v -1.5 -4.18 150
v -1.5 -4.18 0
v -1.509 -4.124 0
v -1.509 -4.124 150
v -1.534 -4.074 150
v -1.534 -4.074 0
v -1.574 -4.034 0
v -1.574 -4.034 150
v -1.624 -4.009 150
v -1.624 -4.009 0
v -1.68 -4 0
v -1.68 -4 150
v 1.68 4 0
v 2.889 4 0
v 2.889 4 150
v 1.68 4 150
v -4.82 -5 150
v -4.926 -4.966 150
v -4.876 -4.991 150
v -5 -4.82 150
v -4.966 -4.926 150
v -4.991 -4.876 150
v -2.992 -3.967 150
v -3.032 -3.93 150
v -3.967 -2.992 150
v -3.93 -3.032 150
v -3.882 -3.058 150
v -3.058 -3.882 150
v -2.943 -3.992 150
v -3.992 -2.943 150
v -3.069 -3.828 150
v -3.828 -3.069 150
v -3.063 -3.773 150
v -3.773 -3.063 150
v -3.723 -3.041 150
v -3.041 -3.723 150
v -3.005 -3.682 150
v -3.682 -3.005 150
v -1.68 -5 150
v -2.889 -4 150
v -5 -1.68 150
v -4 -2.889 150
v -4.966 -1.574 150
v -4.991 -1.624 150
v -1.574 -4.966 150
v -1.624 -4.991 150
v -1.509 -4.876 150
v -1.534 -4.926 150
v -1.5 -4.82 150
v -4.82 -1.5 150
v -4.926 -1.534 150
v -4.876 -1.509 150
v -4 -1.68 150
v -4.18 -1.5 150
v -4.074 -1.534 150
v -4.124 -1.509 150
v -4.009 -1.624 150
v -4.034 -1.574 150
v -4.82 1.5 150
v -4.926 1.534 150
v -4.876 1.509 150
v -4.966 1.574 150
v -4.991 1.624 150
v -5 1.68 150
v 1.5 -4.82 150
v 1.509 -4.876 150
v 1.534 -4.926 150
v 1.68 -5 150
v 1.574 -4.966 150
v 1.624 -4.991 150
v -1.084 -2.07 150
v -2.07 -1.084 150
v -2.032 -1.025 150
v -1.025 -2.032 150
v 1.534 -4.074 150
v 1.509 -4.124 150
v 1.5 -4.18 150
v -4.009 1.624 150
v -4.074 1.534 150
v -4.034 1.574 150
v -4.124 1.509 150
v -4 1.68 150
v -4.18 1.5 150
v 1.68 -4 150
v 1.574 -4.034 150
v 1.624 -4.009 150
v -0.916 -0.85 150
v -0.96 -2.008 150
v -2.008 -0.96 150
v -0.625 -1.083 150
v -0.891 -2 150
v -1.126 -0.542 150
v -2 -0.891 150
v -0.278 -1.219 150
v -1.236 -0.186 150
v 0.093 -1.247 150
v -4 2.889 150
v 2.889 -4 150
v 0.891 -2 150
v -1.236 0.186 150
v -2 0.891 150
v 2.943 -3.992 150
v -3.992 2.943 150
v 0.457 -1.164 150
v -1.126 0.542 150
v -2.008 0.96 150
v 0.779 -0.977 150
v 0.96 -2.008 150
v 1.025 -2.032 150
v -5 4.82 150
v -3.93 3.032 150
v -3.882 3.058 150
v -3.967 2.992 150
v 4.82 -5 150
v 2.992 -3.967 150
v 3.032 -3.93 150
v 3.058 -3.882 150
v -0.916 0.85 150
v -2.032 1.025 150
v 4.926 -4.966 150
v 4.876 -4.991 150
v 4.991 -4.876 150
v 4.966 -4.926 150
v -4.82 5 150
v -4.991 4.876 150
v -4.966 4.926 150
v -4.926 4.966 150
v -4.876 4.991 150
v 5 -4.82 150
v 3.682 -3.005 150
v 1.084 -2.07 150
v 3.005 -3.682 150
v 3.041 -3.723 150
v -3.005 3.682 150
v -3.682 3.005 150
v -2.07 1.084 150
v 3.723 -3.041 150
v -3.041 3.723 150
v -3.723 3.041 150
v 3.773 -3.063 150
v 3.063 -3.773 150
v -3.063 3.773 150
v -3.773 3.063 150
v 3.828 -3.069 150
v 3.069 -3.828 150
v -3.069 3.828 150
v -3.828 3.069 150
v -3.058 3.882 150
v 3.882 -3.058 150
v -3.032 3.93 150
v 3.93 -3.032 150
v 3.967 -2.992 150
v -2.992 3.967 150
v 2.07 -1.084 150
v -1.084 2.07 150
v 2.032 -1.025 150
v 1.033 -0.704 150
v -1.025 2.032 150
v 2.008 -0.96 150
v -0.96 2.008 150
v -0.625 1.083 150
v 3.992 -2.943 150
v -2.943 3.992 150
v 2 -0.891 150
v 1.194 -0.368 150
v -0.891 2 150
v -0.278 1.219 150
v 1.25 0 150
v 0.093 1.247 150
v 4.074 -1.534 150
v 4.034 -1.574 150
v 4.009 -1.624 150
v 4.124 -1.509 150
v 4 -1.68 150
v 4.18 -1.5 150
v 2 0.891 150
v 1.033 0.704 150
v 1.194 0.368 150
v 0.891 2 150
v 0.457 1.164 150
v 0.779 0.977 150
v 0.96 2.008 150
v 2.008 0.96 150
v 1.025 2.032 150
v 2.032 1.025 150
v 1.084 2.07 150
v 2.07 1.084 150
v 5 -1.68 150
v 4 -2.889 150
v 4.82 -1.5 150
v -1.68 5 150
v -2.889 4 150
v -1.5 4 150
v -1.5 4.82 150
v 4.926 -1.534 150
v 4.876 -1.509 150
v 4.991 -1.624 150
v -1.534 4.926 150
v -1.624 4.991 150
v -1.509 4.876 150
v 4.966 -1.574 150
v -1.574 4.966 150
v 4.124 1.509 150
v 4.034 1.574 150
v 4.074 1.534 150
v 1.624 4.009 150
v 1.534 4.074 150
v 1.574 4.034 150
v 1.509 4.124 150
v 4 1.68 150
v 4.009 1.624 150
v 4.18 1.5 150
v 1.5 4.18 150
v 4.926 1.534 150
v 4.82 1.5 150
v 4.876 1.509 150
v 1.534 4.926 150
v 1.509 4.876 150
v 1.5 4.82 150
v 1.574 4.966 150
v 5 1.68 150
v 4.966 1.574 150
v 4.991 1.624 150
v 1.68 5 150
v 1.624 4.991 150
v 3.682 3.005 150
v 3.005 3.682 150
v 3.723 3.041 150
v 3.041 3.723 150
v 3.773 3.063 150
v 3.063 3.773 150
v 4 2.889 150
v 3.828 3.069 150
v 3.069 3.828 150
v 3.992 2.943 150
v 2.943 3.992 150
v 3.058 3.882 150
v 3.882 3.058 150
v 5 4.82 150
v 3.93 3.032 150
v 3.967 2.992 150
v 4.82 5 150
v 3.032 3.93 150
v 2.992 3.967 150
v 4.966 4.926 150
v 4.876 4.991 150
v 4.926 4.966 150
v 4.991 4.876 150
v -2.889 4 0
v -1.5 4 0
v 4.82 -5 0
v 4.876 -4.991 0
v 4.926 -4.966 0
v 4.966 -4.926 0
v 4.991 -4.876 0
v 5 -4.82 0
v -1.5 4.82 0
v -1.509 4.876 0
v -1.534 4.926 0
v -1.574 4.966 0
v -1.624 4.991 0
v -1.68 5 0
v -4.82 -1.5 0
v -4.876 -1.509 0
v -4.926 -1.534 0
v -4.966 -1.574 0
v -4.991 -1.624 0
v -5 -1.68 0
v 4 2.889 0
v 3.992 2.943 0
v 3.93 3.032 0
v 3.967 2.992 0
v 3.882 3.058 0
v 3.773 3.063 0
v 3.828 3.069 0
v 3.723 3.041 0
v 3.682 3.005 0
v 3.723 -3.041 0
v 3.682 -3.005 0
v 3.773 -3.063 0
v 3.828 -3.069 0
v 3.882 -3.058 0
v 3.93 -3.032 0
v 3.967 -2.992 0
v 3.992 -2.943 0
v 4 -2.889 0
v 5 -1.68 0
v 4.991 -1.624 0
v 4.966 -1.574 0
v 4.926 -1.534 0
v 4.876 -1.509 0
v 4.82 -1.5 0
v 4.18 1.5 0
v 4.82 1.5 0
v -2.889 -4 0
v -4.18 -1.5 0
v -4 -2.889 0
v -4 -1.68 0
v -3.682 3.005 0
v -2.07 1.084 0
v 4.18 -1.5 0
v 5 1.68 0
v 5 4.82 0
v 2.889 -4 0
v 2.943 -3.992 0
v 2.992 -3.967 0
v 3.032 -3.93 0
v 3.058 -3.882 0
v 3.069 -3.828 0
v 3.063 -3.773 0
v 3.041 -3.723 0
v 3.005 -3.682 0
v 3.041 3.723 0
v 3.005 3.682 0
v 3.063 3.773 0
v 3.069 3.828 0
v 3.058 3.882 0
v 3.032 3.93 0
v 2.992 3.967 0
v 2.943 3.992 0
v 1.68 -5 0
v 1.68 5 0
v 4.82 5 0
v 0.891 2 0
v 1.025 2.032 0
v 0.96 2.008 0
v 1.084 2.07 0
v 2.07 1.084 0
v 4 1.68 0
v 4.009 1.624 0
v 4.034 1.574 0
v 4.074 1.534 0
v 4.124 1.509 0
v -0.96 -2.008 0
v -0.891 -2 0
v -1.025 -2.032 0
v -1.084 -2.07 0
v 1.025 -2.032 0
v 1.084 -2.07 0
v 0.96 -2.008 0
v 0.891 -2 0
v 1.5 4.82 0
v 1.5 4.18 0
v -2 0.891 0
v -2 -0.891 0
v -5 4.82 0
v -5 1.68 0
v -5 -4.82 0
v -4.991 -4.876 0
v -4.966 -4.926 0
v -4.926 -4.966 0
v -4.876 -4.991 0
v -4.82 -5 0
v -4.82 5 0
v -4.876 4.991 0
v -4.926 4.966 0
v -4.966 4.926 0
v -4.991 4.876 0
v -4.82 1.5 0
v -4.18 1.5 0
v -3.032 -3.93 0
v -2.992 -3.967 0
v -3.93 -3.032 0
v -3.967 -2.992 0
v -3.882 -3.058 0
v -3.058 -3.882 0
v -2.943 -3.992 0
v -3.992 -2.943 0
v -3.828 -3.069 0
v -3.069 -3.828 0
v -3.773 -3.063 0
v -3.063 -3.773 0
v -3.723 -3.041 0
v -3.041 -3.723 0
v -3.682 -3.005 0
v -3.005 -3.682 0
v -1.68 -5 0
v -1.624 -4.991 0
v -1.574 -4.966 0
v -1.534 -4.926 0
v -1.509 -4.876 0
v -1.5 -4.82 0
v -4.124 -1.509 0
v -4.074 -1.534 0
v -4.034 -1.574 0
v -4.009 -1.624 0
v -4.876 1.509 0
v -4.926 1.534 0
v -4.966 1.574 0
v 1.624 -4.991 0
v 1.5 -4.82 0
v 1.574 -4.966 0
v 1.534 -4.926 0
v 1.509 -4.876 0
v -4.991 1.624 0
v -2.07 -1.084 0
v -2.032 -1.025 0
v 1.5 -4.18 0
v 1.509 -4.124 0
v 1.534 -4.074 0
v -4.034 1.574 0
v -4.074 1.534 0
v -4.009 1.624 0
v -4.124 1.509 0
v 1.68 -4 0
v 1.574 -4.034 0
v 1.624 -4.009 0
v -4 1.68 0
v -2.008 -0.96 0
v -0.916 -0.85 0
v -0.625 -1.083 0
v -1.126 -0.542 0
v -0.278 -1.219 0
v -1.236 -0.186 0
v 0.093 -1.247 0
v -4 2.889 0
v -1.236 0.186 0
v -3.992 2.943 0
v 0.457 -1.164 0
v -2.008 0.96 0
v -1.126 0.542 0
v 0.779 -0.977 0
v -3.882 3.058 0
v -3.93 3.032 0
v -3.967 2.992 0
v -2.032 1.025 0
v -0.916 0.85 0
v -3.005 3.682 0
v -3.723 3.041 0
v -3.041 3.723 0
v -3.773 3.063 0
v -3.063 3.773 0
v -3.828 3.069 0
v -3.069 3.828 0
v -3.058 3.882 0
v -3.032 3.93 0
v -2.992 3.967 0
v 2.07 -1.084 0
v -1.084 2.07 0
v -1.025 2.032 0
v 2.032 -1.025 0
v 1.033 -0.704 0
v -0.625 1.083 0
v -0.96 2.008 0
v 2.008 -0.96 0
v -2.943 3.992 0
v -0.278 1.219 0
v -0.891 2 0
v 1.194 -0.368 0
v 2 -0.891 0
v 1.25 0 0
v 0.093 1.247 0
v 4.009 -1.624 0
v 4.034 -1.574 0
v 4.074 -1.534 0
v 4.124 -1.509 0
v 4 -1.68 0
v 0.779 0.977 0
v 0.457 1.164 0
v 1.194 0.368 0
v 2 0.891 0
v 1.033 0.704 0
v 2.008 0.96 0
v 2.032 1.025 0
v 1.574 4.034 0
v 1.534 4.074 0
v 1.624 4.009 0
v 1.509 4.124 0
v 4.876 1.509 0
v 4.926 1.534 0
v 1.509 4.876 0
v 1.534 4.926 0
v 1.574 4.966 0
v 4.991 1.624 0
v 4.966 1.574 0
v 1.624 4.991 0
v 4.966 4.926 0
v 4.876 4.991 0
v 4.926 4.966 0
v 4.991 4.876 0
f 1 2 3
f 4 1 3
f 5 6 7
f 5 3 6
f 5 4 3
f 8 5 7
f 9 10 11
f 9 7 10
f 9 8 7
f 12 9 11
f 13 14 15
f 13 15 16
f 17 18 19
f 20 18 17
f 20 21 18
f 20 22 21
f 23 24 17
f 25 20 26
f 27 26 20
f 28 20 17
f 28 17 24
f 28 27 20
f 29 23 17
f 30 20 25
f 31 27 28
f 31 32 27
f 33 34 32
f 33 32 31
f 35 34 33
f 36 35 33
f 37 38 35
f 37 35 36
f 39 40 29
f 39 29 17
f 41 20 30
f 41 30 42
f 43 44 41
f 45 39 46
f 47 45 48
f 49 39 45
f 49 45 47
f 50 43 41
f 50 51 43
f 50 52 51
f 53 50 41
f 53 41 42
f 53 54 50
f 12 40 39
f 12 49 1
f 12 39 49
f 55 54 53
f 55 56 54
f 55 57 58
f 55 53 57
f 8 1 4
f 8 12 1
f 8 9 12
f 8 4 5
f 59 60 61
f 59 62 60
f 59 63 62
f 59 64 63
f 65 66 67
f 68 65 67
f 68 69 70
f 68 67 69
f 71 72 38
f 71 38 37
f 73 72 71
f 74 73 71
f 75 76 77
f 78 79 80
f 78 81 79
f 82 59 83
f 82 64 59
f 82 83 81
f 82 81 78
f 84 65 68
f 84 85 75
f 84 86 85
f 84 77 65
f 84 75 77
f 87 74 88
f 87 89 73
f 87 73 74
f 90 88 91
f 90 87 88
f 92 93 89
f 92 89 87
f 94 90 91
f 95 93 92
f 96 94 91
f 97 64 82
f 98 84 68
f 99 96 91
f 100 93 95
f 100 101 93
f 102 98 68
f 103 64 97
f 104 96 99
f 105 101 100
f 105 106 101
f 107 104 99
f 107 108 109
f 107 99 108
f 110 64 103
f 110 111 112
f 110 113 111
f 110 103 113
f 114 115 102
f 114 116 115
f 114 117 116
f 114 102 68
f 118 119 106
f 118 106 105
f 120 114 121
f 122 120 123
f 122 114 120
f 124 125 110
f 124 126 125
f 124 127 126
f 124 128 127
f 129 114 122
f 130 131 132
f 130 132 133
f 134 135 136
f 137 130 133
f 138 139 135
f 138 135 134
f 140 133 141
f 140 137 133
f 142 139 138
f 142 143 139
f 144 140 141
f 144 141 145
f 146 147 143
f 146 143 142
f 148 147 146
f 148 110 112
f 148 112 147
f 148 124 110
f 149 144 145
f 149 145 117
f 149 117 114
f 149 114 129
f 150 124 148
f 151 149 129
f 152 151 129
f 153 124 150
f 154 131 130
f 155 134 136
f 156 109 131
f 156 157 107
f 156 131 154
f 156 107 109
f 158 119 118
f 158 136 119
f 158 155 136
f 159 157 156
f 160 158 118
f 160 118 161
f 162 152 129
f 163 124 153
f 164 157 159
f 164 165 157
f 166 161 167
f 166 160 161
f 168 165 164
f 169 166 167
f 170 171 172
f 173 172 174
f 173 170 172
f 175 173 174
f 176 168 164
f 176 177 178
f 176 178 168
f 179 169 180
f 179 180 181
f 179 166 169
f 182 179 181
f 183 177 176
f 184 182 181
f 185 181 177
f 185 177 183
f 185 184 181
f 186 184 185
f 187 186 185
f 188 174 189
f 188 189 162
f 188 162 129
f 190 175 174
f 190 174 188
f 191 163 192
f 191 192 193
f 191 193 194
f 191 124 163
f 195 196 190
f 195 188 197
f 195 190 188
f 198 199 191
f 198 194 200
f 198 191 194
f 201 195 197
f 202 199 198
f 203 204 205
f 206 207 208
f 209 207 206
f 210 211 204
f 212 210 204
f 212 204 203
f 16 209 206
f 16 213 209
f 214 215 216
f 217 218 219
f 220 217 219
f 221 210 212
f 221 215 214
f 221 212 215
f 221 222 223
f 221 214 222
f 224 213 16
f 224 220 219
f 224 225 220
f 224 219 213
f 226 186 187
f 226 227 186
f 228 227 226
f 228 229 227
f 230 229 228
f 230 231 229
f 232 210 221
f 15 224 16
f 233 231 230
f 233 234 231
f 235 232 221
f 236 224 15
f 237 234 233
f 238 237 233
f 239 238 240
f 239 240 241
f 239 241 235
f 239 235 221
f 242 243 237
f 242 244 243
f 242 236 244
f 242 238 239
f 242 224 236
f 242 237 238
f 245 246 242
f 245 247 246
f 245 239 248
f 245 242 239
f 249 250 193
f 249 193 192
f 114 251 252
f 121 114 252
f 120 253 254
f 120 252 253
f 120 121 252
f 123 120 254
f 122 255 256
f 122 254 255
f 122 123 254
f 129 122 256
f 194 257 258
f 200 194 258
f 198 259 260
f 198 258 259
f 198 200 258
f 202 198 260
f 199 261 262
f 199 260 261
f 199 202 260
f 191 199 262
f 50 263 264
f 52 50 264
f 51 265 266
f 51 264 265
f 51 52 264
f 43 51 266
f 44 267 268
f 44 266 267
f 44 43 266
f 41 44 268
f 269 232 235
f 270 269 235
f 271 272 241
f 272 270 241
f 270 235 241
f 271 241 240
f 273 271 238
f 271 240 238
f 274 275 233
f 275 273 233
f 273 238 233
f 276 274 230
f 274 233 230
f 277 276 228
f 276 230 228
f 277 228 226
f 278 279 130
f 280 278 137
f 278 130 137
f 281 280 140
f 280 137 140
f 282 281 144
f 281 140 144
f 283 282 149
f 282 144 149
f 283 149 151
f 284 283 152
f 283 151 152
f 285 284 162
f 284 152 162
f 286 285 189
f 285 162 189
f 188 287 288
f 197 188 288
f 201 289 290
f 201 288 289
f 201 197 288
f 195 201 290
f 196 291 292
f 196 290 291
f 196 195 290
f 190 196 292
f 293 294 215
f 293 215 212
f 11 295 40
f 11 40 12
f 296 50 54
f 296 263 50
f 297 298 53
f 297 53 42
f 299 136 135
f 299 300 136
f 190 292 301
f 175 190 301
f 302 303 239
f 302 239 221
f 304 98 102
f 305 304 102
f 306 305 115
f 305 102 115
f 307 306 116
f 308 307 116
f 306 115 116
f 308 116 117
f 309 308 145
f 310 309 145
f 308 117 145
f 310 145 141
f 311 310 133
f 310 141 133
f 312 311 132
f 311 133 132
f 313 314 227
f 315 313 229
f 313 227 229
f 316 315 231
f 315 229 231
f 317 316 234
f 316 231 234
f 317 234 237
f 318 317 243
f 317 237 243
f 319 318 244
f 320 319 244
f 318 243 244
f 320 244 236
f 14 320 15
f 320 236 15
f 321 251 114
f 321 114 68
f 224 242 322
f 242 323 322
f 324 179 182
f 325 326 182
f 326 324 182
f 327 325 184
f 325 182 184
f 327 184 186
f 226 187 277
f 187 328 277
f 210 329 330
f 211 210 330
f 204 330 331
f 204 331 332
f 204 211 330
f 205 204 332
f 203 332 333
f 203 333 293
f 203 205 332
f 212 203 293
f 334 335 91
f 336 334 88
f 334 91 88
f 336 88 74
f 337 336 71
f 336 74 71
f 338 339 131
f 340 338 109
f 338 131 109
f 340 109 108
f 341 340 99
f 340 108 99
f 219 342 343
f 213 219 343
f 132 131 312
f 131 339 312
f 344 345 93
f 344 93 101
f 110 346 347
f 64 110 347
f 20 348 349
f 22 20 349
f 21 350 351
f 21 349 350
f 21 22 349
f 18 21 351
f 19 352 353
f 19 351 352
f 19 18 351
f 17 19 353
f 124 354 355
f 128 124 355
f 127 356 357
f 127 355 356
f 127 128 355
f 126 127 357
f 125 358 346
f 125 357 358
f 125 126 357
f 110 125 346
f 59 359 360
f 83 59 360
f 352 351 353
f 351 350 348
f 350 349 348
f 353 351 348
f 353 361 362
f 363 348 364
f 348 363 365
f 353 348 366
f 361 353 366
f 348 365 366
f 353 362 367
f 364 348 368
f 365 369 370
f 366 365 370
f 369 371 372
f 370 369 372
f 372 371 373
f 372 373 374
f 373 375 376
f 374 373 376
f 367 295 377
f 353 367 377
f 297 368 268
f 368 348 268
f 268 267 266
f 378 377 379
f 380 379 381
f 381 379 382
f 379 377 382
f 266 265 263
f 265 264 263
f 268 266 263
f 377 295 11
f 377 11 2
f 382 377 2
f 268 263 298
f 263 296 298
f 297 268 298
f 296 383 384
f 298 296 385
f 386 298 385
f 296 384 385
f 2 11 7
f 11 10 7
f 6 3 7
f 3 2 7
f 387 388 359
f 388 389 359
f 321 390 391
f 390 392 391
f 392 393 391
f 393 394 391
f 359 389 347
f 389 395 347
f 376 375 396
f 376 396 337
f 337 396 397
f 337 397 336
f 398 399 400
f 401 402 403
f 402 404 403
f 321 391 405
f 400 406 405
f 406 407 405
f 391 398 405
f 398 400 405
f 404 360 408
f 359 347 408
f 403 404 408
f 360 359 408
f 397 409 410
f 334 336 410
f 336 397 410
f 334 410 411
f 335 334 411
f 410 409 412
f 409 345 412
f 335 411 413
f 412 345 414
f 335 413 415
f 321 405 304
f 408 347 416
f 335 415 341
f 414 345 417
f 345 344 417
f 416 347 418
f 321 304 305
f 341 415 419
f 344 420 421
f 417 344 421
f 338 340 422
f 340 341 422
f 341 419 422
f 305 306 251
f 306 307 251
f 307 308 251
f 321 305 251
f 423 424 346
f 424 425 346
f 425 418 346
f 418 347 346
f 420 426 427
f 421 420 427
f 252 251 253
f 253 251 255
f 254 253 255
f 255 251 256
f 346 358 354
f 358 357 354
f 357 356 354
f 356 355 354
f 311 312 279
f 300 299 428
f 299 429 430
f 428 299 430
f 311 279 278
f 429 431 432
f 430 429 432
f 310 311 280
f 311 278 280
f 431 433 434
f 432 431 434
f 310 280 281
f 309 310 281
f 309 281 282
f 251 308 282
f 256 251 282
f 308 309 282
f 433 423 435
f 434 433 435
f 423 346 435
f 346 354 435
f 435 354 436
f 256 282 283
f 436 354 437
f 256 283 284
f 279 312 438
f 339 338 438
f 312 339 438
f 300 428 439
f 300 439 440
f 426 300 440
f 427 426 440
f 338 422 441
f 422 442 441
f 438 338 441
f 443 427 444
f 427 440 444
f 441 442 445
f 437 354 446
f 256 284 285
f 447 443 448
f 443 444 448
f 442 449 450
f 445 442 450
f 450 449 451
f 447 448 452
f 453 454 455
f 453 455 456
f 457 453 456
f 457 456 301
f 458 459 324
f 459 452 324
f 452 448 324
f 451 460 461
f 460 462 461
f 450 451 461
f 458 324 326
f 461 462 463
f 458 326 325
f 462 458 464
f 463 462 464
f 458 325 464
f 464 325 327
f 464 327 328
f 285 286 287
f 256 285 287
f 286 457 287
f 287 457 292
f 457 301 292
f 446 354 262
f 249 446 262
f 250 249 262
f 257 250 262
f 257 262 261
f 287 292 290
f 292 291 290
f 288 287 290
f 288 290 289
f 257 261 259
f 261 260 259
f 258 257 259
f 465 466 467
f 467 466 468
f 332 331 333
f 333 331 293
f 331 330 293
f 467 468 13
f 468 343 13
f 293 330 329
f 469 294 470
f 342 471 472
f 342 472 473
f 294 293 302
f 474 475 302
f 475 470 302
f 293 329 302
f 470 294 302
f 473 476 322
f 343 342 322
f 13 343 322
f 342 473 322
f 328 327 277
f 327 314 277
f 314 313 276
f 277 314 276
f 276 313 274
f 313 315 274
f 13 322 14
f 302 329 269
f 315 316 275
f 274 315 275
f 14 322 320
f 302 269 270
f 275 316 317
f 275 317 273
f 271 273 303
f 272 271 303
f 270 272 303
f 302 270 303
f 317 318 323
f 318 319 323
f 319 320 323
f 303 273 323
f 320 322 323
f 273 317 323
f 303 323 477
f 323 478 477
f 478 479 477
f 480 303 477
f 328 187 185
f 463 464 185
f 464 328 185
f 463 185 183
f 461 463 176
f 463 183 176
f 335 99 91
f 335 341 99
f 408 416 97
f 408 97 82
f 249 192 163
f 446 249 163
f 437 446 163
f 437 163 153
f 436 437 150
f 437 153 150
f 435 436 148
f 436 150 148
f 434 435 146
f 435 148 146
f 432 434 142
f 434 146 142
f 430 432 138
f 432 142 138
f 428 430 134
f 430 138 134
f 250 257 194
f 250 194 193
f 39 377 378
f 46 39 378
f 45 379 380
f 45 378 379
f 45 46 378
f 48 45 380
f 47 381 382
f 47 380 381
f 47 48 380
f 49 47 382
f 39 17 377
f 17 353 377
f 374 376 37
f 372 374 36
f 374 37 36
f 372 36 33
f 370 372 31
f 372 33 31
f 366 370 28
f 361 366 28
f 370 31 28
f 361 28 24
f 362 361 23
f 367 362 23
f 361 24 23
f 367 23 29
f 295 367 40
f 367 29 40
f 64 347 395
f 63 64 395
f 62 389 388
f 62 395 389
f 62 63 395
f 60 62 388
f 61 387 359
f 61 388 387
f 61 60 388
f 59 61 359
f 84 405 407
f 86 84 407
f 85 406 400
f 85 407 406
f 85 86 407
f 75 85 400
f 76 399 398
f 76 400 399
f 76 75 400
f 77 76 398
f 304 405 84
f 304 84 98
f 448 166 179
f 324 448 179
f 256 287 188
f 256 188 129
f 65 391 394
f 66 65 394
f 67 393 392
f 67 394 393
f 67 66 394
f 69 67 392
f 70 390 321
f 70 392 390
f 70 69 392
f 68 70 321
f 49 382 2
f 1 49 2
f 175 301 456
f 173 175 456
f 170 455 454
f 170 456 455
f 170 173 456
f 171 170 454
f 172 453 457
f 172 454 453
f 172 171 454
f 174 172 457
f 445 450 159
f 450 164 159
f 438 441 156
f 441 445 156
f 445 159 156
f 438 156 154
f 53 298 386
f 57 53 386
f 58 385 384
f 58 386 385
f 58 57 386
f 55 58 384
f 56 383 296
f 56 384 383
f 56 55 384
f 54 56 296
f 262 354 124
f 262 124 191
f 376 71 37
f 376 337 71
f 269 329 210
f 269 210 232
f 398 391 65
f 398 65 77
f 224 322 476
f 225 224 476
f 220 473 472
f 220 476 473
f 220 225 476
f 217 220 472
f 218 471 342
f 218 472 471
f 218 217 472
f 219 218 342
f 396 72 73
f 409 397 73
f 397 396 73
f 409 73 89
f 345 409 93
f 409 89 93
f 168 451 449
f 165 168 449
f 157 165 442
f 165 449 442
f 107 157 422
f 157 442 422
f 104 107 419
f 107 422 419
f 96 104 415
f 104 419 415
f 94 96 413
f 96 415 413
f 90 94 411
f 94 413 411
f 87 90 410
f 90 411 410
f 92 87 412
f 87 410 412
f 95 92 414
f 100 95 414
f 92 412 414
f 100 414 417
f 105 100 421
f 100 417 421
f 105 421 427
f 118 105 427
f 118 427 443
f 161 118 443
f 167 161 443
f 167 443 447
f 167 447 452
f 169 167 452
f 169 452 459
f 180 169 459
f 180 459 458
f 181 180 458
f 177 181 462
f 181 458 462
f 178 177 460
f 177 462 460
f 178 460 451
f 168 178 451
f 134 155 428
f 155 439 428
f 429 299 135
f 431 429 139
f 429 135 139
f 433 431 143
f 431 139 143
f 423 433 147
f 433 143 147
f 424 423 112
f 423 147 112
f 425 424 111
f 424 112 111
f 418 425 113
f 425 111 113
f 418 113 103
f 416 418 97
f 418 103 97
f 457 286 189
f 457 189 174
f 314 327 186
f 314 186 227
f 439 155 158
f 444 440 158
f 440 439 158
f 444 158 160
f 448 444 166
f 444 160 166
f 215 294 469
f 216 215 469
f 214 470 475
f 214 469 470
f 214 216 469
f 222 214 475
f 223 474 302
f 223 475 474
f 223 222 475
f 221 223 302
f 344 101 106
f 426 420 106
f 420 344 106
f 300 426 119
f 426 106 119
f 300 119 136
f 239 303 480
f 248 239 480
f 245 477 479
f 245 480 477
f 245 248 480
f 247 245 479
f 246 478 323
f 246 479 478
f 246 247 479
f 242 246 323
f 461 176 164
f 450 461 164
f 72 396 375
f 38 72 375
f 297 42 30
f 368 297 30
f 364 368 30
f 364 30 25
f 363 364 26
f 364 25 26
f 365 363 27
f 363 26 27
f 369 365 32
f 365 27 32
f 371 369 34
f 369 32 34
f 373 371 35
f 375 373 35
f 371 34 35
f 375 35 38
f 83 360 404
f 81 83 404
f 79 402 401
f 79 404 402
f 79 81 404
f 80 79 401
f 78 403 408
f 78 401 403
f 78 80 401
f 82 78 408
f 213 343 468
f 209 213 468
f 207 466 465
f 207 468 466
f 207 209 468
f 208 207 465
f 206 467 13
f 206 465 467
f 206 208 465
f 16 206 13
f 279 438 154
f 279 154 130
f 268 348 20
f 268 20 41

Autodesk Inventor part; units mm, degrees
ref_plane "YZ Plane" through (0, 0, 0) normal (1, 0, 0) x (0, 1, 0)
ref_plane "XZ Plane" through (0, 0, 0) normal (0, 1, 0) x (-1, 0, 0)
ref_plane "XY Plane" through (0, 0, 0) normal (0, 0, 1) x (1, 0, 0)
sketch "Sketch1" plane through (0, 0, 0) normal (0, 0, 1) x (1, 0, 0)
  circle A0 centre (0, 0) radius 1.25
  line L0 (0, -7) -> (0, 7)
  line L1 (-7.0223, 0) -> (7.1337, 0)
  line L2 (5, 5) -> (1.5, 5)
  line L3 (1.5, 5) -> (1.5, 4)
  line L4 (5, 5) -> (5, 1.5)
  line L5 (-1, 2) -> (1, 2)
  line L6 (2, 1) -> (2, -1)
  line L7 (1, -2) -> (-1, -2)
  line L8 (-2, -1) -> (-2, 1)
  line L9 (1, 2) -> (3.3835, 4)
  line L10 (2, 2) -> (4.1114, 2) construction
  line L11 (3.3835, 4) -> (1.5, 4)
  line L12 (2, 1) -> (4, 3.3835)
  line L13 (2, 1) -> (5.1114, 1) construction
  line L14 (5, 1.5) -> (4, 1.5)
  line L15 (4, 1.5) -> (4, 3.3835)
  line L16 (5, 5) -> (5, 1.5)
  line L17 (-5, 5) -> (-1.5, 5)
  line L18 (1.5, 5) -> (5, 5)
  line L19 (5, 5) -> (5, 1.5)
  line L20 (5, 0) -> (5, -5)
  line L21 (-2, 1) -> (-4, 3.3835)
  line L22 (-4, 3.3835) -> (-4, 1.5)
  line L23 (-5, 1.5) -> (-4, 1.5)
  line L24 (-5, 5) -> (-5, 1.5)
  line L25 (-5, 5) -> (-1.5, 5)
  line L26 (-1.5, 5) -> (-1.5, 4)
  line L27 (-1.5, 4) -> (-3.3835, 4)
  line L28 (-1, 2) -> (-3.3835, 4)
  line L29 (-1, -2) -> (-3.3835, -4)
  line L30 (-3.3835, -4) -> (-1.5, -4)
  line L31 (-1.5, -5) -> (-1.5, -4)
  line L32 (-5, -5) -> (-1.5, -5)
  line L33 (-5, -5) -> (-5, -1.5)
  line L34 (-5, -1.5) -> (-4, -1.5)
  line L35 (-4, -1.5) -> (-4, -3.3835)
  line L36 (-2, -1) -> (-4, -3.3835)
  line L37 (2, -1) -> (4, -3.3835)
  line L38 (4, -3.3835) -> (4, -1.5)
  line L39 (5, -1.5) -> (4, -1.5)
  line L40 (5, -5) -> (5, -1.5)
  line L41 (5, -5) -> (1.5, -5)
  line L42 (1.5, -5) -> (1.5, -4)
  line L43 (1.5, -4) -> (3.3835, -4)
  line L44 (1, -2) -> (3.3835, -4)
  line L45 (-5, -5) -> (-5, -1.5)
  line L46 (-5, 1.5) -> (-5, 5)
  line L47 (5, -5) -> (1.5, -5)
  line L48 (-1.5, -5) -> (-5, -5)
  dimension "d0" = 2.5
  dimension "d3" = 3.5
  dimension "d4" = 1
  dimension "d5" = 90
  dimension "d6" = 3.5
  dimension "d10" = 2
  dimension "d11" = 40
  dimension "d13" = 50
  dimension "d14" = 1
  dimension "d17" = 360
  dimension "d19" = 3.1115
extrude "length" add sketch "Sketch1" along normal blind 150 contours L1 L6 L37 L38 L39 L20 L41 L42 L43 L44 L7 L0 A0 | A0 L0 L5 L9 L11 L3 L2 L4 L14 L15 L12 L6 L1 | A0 L1 L8 L21 L22 L23 L24 L17 L26 L27 L28 L5 L0 | L0 L7 L29 L30 L31 L32 L33 L34 L35 L36 L8 L1 A0
fillet "Fillet1" radius 0.18 27 edges at (-1.5, 5, 75) (-5, 5, 75) (-5, 1.5, 75) (-4, 1.5, 75) (-4, 3.3835, 75) (-3.3835, 4, 75) (4, 3.3835, 75) (3.3835, 4, 75) (5, 5, 75) (1.5, 5, 75) (1.5, 4, 75) (4, 1.5, 75) (5, 1.5, 75) (5, -1.5, 75) (4, -1.5, 75) (5, -5, 75) (1.5, -5, 75) (1.5, -4, 75) (3.3835, -4, 75) (4, -3.3835, 75) (-4, -1.5, 75) (-5, -1.5, 75) (-4, -3.3835, 75) (-3.3835, -4, 75) (-1.5, -4, 75) (-1.5, -5, 75) (-5, -5, 75)
fillet "Fillet2" radius 0.3 8 edges at (-1, 2, 75) (1, 2, 75) (2, 1, 75) (2, -1, 75) (1, -2, 75) (-1, -2, 75) (-2, -1, 75) (-2, 1, 75)
thread "Thread1"
thread "Thread2"
properties part number "Beam_15mm"
